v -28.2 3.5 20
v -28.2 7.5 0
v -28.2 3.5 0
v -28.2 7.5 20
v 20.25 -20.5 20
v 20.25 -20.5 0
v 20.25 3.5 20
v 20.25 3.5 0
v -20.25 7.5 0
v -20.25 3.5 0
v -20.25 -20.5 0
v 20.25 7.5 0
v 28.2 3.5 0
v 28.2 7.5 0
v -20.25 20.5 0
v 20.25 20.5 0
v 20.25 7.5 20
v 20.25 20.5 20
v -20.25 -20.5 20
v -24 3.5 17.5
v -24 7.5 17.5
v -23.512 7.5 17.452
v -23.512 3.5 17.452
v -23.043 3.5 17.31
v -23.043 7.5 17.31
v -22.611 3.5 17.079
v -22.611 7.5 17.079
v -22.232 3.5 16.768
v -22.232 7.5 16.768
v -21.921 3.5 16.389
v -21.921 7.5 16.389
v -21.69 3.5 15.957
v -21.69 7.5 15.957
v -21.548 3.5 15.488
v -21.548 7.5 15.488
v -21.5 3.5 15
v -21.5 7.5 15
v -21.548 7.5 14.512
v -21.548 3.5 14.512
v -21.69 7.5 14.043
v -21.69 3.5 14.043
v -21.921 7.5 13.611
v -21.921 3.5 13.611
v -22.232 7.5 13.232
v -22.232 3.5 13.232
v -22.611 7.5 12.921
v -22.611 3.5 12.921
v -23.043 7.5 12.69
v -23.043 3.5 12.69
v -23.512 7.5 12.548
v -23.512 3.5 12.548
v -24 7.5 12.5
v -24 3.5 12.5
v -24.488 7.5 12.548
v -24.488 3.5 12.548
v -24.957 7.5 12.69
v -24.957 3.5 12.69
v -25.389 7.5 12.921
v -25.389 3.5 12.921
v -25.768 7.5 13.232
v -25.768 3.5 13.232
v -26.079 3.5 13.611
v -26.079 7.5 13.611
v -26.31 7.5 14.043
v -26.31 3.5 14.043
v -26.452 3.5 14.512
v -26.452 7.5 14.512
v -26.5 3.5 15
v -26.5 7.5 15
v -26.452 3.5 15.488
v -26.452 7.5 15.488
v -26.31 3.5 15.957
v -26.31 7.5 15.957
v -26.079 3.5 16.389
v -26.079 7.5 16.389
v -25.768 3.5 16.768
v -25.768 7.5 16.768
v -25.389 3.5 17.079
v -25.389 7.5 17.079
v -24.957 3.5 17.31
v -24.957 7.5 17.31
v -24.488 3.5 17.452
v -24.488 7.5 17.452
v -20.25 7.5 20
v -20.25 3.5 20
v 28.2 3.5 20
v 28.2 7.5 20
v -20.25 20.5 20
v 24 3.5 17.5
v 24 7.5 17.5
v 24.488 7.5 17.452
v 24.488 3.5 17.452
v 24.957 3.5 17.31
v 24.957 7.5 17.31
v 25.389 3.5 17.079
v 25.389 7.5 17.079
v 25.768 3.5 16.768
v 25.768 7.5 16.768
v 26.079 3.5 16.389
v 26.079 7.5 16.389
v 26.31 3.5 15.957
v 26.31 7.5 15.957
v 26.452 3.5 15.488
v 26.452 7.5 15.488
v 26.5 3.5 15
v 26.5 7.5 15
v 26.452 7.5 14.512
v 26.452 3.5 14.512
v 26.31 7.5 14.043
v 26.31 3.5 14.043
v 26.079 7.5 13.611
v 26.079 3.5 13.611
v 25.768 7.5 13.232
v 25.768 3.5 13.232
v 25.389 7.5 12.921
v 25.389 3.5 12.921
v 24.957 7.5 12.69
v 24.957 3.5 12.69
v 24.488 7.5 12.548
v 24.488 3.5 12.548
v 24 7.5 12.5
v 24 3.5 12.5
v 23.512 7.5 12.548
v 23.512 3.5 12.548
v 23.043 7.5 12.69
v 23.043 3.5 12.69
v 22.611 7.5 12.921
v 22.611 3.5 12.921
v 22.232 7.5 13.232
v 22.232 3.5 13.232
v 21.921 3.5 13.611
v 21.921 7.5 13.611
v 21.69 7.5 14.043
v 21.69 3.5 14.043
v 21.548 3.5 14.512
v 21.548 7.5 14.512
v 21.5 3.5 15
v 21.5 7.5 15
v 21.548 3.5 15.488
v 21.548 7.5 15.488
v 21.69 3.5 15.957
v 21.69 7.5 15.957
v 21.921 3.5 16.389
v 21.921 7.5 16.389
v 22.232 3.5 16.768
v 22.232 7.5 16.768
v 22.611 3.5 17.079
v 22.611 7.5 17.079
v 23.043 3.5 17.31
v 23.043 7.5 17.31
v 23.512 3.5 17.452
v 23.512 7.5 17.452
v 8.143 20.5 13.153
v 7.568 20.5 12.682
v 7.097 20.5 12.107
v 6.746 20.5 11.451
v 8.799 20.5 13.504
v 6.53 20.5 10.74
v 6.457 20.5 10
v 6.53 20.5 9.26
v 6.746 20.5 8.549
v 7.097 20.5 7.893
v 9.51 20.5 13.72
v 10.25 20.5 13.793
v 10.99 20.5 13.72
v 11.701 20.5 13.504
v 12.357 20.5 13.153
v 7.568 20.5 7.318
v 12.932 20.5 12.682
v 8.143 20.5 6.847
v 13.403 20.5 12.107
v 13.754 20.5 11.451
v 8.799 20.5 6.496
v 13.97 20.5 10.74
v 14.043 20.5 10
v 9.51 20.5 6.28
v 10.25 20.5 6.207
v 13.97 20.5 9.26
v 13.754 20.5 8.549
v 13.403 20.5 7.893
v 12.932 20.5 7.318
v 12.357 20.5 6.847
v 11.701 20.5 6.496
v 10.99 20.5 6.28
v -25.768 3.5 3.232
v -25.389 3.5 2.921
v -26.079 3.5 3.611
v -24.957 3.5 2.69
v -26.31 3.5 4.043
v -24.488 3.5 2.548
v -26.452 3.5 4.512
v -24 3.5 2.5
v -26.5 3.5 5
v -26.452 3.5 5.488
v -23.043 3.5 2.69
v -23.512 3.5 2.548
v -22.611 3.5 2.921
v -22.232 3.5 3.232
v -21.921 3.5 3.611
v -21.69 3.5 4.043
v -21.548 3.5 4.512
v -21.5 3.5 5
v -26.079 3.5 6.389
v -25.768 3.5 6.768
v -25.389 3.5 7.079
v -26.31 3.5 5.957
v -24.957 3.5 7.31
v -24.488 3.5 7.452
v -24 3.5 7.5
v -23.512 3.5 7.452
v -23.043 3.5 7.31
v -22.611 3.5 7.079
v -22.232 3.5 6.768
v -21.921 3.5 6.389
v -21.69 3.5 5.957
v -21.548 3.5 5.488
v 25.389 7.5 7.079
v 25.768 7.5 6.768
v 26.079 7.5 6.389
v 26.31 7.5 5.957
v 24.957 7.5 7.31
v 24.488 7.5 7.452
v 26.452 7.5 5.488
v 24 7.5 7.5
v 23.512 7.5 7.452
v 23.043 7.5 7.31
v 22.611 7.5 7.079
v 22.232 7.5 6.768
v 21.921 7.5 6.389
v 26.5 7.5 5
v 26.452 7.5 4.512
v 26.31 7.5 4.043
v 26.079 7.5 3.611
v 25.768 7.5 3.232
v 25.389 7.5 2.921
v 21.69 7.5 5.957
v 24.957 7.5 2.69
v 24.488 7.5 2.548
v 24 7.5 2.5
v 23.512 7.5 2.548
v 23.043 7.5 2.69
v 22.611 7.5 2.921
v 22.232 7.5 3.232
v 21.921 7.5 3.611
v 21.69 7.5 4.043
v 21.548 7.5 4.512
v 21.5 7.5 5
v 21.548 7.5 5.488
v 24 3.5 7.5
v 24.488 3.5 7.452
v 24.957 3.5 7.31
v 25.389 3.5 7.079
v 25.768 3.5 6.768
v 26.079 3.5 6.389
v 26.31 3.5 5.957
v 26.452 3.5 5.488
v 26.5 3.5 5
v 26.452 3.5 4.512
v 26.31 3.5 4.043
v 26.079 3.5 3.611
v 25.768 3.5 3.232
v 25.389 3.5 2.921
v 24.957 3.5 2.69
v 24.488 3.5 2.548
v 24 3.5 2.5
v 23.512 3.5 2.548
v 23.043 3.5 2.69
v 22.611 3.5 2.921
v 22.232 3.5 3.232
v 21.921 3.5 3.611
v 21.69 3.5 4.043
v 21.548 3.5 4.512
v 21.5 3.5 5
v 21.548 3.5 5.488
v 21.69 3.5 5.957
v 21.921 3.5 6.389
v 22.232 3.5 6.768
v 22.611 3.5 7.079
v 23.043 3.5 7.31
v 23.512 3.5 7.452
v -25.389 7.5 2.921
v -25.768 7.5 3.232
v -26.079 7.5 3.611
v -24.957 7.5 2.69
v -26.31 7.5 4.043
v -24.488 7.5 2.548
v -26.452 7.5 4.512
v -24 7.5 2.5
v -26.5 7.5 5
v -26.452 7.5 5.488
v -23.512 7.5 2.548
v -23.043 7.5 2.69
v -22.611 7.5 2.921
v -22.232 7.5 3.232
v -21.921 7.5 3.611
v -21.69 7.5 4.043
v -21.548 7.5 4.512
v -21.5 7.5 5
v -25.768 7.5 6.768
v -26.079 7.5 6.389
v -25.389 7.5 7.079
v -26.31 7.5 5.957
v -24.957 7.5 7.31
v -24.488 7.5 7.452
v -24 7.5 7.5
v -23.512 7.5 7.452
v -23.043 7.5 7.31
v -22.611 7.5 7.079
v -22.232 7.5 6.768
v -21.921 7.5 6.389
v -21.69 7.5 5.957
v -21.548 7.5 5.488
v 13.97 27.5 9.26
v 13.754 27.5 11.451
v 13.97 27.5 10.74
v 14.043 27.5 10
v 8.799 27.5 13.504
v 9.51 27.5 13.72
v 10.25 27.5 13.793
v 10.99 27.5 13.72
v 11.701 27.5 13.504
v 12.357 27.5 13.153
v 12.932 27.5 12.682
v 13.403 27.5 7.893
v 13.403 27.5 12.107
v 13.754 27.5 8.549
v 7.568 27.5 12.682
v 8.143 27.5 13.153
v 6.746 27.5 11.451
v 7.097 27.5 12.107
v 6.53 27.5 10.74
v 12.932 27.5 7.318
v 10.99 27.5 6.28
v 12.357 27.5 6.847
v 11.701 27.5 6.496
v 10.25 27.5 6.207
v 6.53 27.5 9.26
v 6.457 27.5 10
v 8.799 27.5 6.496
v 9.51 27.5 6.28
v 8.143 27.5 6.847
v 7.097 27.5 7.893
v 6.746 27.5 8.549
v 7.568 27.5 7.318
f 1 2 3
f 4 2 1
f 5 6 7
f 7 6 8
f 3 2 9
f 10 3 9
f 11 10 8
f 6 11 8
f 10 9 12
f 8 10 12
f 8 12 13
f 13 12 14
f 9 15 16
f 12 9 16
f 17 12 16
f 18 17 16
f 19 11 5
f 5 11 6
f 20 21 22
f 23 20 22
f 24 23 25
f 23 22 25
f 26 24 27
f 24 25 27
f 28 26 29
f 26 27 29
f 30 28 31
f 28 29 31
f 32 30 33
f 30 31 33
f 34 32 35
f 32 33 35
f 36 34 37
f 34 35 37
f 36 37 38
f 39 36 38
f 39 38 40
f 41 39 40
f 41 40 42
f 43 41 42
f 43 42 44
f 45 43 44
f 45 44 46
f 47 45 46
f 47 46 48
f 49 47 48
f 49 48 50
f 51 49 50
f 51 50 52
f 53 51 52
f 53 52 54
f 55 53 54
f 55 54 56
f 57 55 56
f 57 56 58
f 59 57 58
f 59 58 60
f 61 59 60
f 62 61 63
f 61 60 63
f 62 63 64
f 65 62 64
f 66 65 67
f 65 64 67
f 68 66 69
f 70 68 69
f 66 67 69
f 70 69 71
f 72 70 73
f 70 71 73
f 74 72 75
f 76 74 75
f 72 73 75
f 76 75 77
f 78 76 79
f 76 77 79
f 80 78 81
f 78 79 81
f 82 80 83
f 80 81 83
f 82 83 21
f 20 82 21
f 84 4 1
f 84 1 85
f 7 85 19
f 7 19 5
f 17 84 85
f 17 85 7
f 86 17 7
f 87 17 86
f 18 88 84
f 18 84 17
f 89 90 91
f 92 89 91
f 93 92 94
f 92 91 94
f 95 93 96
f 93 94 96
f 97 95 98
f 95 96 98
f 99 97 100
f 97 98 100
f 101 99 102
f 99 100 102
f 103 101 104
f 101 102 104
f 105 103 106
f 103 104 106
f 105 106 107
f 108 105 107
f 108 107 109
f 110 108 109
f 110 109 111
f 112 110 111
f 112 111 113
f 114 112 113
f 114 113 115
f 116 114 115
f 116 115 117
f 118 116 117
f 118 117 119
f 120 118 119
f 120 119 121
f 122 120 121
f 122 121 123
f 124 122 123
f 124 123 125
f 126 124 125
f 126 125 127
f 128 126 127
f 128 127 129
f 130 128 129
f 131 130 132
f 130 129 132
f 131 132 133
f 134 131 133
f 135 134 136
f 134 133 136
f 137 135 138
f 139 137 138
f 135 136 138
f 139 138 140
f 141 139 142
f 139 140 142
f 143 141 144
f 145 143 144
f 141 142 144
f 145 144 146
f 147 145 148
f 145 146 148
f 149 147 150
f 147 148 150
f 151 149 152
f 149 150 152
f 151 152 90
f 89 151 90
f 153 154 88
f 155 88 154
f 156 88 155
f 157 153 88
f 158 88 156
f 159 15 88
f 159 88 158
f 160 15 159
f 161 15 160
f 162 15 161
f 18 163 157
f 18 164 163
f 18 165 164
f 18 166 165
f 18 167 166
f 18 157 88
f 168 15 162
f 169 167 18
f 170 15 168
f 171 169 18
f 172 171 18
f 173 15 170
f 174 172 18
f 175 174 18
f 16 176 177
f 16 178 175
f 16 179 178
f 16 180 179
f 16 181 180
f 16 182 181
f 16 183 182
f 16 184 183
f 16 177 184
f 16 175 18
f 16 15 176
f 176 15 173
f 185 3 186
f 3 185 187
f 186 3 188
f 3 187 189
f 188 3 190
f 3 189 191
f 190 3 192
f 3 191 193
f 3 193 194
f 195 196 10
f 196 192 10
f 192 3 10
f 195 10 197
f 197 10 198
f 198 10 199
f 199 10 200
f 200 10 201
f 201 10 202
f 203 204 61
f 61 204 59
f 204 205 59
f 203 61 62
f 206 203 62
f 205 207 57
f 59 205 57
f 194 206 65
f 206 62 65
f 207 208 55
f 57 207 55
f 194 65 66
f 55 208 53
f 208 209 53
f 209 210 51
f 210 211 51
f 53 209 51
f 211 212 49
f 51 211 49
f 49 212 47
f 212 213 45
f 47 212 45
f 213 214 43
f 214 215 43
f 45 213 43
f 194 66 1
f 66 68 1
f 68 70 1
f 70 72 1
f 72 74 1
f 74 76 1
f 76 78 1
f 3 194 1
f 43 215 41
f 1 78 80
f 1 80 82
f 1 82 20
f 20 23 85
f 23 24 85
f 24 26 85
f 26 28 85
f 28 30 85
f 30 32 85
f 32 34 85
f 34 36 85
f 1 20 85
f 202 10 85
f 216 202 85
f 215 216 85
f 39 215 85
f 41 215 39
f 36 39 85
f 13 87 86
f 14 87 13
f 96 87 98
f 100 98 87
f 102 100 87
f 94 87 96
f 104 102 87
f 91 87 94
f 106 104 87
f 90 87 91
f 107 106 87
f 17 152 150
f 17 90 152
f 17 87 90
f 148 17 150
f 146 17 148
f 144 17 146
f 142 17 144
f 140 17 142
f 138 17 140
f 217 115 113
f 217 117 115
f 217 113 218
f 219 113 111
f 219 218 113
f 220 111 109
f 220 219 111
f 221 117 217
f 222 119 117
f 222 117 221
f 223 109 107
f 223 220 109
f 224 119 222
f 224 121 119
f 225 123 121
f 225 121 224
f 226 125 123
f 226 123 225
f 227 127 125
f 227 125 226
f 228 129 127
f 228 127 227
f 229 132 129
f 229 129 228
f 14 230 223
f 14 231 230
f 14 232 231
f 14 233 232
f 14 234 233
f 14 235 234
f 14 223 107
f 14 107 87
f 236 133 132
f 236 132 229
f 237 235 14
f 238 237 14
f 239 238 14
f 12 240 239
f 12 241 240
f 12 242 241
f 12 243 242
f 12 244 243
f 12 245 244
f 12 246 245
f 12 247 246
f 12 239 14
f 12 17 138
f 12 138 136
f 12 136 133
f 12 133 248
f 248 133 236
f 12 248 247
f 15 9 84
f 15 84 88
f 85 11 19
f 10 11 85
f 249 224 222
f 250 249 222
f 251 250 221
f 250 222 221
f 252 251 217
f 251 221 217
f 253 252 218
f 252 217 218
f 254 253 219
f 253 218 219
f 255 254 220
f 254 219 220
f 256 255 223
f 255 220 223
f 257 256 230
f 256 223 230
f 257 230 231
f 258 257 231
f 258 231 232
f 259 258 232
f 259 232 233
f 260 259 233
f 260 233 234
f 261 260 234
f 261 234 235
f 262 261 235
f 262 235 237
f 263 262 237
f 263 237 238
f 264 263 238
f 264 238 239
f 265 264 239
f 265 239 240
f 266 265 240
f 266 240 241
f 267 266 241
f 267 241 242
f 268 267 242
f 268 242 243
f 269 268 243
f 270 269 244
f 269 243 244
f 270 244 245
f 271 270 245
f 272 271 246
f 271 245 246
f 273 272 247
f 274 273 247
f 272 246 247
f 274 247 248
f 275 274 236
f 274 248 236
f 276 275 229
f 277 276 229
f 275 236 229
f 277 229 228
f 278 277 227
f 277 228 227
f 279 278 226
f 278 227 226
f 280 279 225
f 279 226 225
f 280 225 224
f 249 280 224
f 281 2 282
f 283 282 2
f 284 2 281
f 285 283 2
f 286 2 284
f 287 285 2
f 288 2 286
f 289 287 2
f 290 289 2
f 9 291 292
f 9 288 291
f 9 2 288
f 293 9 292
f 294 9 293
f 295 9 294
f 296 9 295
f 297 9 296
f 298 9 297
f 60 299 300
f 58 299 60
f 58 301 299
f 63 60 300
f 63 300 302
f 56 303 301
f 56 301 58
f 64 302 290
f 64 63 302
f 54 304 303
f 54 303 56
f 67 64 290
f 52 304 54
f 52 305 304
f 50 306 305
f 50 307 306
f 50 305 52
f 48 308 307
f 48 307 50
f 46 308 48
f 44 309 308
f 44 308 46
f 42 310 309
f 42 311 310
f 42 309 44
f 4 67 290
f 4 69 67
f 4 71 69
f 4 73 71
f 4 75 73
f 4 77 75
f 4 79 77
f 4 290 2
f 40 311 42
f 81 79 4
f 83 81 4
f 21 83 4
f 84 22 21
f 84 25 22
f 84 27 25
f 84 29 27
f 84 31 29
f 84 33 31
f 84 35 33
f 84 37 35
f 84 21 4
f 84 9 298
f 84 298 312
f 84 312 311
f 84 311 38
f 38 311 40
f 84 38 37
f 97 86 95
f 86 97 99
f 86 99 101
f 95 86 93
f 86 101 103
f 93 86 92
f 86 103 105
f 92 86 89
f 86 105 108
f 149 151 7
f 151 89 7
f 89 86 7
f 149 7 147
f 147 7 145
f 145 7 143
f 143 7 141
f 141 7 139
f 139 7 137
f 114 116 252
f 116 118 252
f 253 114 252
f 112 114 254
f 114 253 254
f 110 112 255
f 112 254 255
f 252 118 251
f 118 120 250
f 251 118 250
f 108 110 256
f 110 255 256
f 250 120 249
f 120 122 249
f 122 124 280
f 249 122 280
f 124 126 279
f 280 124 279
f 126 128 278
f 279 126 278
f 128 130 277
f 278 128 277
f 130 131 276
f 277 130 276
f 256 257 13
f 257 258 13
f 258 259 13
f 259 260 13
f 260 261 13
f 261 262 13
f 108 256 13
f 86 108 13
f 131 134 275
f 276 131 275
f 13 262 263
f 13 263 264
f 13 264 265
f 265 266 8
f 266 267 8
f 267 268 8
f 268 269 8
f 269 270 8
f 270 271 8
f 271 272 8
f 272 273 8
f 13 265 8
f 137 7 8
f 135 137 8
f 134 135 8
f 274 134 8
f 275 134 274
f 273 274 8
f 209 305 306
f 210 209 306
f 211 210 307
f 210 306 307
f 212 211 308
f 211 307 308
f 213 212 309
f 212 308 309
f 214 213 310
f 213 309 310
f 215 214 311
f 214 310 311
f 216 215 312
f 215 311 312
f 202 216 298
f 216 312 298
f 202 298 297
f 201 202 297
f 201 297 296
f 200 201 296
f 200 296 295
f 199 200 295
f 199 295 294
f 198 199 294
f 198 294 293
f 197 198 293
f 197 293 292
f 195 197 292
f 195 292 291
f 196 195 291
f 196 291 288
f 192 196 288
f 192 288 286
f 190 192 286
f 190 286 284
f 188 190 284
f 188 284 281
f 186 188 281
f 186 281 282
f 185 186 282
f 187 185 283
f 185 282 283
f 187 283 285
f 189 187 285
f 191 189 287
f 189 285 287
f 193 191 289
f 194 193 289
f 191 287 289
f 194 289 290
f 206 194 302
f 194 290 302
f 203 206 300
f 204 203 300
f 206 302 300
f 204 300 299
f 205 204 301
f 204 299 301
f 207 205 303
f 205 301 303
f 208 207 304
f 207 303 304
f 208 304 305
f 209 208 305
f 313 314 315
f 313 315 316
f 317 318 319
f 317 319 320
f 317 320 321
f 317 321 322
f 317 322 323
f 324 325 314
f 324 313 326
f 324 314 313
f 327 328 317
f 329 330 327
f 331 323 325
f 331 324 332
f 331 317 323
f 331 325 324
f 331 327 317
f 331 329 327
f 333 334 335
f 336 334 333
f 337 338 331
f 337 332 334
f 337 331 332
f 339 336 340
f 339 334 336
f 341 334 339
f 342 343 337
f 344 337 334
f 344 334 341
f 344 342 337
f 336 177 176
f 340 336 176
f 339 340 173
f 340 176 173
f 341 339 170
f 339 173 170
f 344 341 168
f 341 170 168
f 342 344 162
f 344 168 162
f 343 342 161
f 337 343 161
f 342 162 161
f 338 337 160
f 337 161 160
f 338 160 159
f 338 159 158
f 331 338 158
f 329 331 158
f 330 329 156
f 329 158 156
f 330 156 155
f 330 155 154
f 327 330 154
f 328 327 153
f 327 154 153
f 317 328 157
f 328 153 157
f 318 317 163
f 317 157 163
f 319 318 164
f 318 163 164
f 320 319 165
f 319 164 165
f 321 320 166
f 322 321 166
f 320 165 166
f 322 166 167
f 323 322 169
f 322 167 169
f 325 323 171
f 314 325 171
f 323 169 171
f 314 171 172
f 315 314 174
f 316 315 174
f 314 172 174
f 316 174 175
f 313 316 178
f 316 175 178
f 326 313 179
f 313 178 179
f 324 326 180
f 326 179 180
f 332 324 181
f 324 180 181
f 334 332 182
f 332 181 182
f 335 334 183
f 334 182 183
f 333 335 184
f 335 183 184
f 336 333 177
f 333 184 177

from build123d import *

# Parameters (mm, degrees)
SKETCH2_W           = 40.5
SKETCH2_H           = 41
BOSS_EXTRUDE1_DEPTH = 20
SKETCH4_W           = 20
SKETCH4_H           = 4
BOSS_EXTRUDE2_DEPTH = 7.95
SKETCH5_W           = 20
SKETCH5_H           = 4
BOSS_EXTRUDE3_DEPTH = 7.95
SKETCH8_R           = 2.5
CUT_EXTRUDE1_DEPTH  = 45.488650238
SKETCH11_R          = 3.792509707
BOSS_EXTRUDE4_DEPTH = 7


with BuildPart() as part:
    # Sketch2 → Boss-Extrude1 (new body)
    with BuildSketch(Plane.XY):
        Rectangle(SKETCH2_W, SKETCH2_H)
    extrude(amount=BOSS_EXTRUDE1_DEPTH)

    # Sketch4 → Boss-Extrude2 (add)
    with BuildSketch(Plane(origin=(20.25, 0, 0), x_dir=(0, 0, -1), z_dir=(1, 0, 0))):
        with Locations((-10, 5.5)):
            Rectangle(SKETCH4_W, SKETCH4_H)
    extrude(amount=BOSS_EXTRUDE2_DEPTH)

    # Sketch5 → Boss-Extrude3 (add)
    with BuildSketch(Plane.ZY.offset(20.25)):
        with Locations((10, 5.5)):
            Rectangle(SKETCH5_W, SKETCH5_H)
    extrude(amount=BOSS_EXTRUDE3_DEPTH)

    # Sketch8 → Cut-Extrude1 (cut, through all)
    with BuildSketch(Plane(origin=(0, 7.5, 0), x_dir=(1, 0, 0), z_dir=(0, 1, 0))):
        with Locations(Location((24, -5, 0), (0, 0, 270))):
            Circle(SKETCH8_R)
        with Locations(Location((24, -15, 0), (0, 0, 270))):
            Circle(SKETCH8_R)
        with Locations(Location((-24, -5, 0), (0, 0, 270))):
            Circle(SKETCH8_R)
        with Locations(Location((-24, -15, 0), (0, 0, 270))):
            Circle(SKETCH8_R)
    extrude(amount=-CUT_EXTRUDE1_DEPTH, mode=Mode.SUBTRACT)

    # Sketch11 → Boss-Extrude4 (add)
    with BuildSketch(Plane(origin=(0, 20.5, 0), x_dir=(1, 0, 0), z_dir=(0, 1, 0))):
        with Locations(Location((10.25, -10, 0), (0, 0, 90))):
            Circle(SKETCH11_R)
    extrude(amount=BOSS_EXTRUDE4_DEPTH)


solid = part.part
